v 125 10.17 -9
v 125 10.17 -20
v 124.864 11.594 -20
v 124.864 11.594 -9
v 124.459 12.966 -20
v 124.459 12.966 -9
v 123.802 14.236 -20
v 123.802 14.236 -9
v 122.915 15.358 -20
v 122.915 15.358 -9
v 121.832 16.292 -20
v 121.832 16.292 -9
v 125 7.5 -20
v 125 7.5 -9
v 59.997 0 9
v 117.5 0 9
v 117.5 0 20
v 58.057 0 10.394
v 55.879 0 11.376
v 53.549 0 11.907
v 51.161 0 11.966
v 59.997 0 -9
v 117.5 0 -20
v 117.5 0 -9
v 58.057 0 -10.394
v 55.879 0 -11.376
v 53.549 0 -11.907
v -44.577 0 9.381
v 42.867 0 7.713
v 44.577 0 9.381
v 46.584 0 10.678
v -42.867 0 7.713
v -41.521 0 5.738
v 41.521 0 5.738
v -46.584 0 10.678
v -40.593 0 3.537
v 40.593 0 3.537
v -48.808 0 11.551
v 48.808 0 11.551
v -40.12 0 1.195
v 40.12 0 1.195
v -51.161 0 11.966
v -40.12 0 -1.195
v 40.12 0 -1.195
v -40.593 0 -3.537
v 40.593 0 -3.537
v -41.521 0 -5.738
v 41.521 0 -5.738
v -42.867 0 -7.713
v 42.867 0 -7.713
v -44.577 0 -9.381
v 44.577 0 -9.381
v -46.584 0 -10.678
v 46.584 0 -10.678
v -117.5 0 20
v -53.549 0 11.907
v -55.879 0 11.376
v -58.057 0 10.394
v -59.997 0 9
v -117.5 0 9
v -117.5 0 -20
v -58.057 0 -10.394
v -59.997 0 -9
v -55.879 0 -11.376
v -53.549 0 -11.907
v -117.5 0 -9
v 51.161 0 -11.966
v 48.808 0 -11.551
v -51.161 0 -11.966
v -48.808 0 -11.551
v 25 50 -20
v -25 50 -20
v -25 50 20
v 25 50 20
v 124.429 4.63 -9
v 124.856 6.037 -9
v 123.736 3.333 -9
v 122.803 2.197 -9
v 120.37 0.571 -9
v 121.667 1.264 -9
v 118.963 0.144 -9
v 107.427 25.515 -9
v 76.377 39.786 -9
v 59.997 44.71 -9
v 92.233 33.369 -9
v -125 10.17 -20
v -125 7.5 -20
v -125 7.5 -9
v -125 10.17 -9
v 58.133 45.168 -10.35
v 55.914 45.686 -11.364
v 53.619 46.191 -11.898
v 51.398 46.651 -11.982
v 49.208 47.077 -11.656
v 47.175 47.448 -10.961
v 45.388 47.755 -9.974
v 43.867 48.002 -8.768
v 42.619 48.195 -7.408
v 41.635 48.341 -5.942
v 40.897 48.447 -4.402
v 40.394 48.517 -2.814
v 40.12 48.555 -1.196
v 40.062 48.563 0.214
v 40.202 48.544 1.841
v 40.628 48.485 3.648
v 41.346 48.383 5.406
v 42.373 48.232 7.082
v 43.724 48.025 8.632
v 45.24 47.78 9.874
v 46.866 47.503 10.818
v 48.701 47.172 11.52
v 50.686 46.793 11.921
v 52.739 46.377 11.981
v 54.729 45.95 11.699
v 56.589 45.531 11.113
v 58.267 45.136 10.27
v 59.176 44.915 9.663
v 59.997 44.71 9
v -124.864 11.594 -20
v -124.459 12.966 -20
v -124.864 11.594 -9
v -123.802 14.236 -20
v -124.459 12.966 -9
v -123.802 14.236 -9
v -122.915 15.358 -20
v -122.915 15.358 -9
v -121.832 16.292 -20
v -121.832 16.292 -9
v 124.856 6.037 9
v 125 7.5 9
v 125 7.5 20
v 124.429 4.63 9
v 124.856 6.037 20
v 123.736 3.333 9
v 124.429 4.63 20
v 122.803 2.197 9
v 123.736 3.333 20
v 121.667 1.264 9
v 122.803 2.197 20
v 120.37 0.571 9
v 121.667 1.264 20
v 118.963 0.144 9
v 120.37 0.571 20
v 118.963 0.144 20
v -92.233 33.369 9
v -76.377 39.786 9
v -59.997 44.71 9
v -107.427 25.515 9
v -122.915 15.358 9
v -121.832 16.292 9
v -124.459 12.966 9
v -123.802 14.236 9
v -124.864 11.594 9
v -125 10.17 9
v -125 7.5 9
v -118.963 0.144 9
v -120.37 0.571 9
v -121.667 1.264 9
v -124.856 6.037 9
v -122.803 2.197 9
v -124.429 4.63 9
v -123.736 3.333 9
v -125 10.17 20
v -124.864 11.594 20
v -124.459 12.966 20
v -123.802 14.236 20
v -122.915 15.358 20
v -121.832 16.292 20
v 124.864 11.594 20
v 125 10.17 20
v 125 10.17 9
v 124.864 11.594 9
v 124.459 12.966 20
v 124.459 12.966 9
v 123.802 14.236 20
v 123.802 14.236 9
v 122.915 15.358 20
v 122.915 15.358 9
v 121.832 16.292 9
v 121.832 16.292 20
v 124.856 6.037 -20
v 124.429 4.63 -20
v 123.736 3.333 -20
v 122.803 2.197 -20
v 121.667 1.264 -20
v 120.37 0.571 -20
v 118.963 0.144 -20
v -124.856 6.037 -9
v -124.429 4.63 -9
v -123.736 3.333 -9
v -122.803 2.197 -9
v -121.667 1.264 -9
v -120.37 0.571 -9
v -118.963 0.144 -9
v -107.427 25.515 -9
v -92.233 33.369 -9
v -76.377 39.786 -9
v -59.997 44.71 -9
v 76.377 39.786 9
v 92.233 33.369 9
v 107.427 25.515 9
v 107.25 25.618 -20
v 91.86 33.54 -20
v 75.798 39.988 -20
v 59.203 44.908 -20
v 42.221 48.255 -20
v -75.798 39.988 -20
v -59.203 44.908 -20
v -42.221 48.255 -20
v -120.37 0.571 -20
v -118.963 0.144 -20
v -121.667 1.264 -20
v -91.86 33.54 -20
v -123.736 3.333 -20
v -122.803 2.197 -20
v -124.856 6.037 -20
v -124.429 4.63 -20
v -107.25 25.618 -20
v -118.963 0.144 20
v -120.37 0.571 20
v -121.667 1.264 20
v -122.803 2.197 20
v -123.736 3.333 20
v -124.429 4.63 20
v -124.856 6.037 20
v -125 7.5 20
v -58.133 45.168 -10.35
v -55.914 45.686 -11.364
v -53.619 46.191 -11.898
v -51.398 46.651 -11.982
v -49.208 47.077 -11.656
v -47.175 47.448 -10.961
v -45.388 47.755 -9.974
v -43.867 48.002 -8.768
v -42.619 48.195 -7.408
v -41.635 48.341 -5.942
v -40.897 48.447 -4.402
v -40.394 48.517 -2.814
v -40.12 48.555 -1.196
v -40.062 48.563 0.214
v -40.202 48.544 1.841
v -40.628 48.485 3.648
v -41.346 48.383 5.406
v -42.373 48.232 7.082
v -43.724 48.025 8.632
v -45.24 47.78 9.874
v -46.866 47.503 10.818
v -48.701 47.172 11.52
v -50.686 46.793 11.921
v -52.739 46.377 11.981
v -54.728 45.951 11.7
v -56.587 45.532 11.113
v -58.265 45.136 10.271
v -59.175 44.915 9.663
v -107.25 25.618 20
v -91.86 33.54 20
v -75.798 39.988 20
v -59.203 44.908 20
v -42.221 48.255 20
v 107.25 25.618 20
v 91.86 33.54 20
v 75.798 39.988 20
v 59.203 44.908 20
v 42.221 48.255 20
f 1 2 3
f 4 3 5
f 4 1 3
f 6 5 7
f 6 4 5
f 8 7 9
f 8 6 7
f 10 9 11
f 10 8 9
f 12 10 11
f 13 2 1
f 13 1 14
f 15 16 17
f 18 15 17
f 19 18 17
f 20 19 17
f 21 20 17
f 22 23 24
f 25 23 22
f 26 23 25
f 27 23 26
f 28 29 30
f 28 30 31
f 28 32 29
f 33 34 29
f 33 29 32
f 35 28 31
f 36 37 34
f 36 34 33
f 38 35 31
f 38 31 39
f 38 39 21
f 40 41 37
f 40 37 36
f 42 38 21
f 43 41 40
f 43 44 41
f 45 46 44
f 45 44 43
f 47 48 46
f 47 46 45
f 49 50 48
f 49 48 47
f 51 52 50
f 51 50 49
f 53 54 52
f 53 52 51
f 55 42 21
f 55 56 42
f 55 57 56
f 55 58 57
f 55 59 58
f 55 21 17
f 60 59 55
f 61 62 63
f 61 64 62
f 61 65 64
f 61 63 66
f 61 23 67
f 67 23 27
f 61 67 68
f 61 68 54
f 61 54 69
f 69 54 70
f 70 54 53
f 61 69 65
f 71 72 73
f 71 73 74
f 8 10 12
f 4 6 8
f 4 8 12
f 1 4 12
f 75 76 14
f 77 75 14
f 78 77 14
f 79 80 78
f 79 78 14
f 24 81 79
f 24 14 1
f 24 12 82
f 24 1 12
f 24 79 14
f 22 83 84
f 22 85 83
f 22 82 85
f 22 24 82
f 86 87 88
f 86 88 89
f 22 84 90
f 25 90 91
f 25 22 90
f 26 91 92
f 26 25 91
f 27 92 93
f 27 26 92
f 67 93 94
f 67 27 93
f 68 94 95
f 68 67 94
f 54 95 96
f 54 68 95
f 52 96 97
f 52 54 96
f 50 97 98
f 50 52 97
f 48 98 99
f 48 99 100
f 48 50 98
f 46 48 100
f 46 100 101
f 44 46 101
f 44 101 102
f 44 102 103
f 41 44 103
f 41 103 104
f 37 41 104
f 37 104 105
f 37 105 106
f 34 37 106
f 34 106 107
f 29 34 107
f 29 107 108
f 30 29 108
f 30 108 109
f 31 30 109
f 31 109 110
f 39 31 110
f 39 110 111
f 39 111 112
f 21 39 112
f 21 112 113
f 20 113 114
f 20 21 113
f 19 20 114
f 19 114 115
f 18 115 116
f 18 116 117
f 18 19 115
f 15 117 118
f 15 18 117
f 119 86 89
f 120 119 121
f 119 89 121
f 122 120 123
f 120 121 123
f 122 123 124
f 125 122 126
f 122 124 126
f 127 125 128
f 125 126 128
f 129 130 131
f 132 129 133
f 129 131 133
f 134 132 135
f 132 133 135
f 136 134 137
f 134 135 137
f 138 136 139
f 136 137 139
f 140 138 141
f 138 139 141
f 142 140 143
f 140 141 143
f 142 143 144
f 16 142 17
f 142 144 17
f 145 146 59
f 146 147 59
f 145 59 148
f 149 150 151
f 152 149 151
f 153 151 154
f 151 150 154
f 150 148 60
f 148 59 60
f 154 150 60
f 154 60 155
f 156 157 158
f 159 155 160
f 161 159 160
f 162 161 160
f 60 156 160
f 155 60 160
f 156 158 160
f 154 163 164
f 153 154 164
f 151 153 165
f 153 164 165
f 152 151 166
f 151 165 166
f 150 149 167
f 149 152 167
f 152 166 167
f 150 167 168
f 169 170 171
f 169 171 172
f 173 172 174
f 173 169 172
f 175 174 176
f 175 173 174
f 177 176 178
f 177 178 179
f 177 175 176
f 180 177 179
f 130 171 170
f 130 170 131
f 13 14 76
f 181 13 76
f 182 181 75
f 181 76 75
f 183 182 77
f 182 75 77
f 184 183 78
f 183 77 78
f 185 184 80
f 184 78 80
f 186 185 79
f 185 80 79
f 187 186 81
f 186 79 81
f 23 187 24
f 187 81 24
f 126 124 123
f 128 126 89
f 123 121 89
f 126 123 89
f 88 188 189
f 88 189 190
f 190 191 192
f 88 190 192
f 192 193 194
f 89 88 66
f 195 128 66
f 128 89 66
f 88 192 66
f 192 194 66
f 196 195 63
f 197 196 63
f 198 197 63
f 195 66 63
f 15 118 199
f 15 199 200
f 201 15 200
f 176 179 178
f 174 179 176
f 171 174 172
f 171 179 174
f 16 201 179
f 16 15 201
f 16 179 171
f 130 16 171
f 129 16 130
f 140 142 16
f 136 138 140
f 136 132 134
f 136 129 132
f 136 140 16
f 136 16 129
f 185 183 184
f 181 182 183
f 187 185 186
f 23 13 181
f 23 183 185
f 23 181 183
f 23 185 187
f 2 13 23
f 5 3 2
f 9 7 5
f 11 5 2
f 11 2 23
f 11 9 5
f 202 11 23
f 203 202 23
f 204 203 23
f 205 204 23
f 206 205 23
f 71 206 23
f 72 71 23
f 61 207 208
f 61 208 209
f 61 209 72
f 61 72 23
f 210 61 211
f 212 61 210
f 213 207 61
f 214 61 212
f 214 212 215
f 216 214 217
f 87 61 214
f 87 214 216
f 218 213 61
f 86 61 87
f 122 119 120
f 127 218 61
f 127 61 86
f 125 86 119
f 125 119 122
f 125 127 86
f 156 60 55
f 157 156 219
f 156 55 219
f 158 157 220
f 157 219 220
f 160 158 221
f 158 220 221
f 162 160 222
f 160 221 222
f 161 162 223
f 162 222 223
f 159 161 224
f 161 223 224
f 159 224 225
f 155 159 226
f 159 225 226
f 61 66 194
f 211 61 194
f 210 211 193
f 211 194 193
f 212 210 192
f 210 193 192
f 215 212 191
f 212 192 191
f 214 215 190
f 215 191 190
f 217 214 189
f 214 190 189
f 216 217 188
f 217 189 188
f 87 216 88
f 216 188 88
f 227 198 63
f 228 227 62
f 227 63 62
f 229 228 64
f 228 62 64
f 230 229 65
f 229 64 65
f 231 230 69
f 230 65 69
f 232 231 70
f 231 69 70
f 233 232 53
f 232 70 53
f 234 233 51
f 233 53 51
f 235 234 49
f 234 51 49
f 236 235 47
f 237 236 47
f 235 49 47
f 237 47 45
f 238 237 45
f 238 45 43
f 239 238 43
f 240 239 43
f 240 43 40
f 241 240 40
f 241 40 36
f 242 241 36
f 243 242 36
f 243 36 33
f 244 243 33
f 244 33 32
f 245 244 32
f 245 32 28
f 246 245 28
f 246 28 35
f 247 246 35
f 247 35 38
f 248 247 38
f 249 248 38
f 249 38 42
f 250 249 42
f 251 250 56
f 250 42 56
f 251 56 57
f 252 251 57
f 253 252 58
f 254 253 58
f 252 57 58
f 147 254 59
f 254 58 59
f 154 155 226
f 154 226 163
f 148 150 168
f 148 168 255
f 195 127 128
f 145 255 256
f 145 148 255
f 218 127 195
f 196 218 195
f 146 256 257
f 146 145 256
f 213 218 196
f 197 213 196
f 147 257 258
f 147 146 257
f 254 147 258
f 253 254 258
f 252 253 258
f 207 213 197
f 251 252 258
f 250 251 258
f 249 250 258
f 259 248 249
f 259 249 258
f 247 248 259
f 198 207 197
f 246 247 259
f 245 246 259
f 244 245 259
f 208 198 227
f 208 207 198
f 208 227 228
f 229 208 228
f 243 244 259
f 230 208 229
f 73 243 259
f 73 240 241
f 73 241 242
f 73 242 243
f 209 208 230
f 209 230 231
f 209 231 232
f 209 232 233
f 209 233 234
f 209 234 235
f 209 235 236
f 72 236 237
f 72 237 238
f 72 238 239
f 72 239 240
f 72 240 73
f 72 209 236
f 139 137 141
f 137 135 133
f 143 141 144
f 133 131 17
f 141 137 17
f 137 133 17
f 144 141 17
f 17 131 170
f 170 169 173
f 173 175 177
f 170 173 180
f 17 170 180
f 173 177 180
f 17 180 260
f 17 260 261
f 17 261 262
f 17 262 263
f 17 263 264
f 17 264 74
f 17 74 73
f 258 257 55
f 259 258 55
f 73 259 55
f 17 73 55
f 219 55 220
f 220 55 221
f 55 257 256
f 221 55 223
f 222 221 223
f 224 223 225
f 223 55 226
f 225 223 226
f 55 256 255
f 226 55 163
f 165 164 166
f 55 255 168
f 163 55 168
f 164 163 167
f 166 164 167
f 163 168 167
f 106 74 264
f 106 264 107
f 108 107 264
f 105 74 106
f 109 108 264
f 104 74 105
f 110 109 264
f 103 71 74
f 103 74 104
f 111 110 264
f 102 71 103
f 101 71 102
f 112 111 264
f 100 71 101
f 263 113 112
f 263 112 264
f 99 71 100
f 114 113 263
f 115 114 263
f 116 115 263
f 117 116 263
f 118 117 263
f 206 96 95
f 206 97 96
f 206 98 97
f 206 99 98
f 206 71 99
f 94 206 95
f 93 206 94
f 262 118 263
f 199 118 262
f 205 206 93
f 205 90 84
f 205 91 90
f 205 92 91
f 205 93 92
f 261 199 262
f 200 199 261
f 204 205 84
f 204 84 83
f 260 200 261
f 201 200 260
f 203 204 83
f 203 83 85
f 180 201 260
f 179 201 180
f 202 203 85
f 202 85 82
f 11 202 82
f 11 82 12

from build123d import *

# Parameters (mm, degrees)
BOSS_EXTRUDE1_DEPTH      = 20
BOSS_EXTRUDE1_DEPTH_BACK = 20
FILLET4_R                = 7.5
FILLET5_R                = 7.5
FILLET6_R                = 7.5
FILLET7_R                = 7.5
CUT_EXTRUDE6_DEPTH       = 137.106575888


with BuildPart() as part:
    # Sketch1 → Boss-Extrude1 (new, two sides: drawn at the far end of the back side and taken through both)
    with BuildSketch(Plane.XY.offset(-BOSS_EXTRUDE1_DEPTH_BACK)):
        with BuildLine():
            Line((125, 0), (-125, 0))
            Line((-125, 0), (-125, 14))
            ThreePointArc((-125, 14), (-77.640903187, 39.335842187), (-25, 50))
            Line((-25, 50), (25, 50))
            ThreePointArc((25, 50), (77.640903187, 39.335842187), (125, 14))
            Line((125, 14), (125, 0))
        make_face()
    extrude(amount=BOSS_EXTRUDE1_DEPTH + BOSS_EXTRUDE1_DEPTH_BACK)

    # Fillet4
    fillet4_edges = [part.edges().sort_by_distance(p)[0] for p in [
        (-125, 14, 0),
    ]]
    fillet(fillet4_edges, radius=FILLET4_R)

    # Fillet5
    fillet5_edges = [part.edges().sort_by_distance(p)[0] for p in [
        (125, 14, 0),
    ]]
    fillet(fillet5_edges, radius=FILLET5_R)

    # Fillet6
    fillet6_edges = [part.edges().sort_by_distance(p)[0] for p in [
        (125, 0, 0),
    ]]
    fillet(fillet6_edges, radius=FILLET6_R)

    # Fillet7
    fillet7_edges = [part.edges().sort_by_distance(p)[0] for p in [
        (-125, 0, 0),
    ]]
    fillet(fillet7_edges, radius=FILLET7_R)

    # Sketch3 → Cut-Extrude6 (cut, through all)
    with BuildSketch(Plane(origin=(0, 0, 0), x_dir=(1, 0, 0), z_dir=(0, 1, 0))):
        with BuildLine():
            Line((-59.997253933, 9), (-125, 9))
            Line((-125, 9), (-125, -9))
            Line((-125, -9), (-59.997253933, -9))
            ThreePointArc((-59.997253933, -9), (-40.06, 0), (-59.997253933, 9))
        make_face()
        with BuildLine():
            Line((59.997253933, -9), (125, -9))
            Line((125, -9), (125, 9))
            Line((125, 9), (59.997253933, 9))
            ThreePointArc((59.997253933, 9), (40.06, 0), (59.997253933, -9))
        make_face()
    extrude(amount=CUT_EXTRUDE6_DEPTH, mode=Mode.SUBTRACT)


solid = part.part
